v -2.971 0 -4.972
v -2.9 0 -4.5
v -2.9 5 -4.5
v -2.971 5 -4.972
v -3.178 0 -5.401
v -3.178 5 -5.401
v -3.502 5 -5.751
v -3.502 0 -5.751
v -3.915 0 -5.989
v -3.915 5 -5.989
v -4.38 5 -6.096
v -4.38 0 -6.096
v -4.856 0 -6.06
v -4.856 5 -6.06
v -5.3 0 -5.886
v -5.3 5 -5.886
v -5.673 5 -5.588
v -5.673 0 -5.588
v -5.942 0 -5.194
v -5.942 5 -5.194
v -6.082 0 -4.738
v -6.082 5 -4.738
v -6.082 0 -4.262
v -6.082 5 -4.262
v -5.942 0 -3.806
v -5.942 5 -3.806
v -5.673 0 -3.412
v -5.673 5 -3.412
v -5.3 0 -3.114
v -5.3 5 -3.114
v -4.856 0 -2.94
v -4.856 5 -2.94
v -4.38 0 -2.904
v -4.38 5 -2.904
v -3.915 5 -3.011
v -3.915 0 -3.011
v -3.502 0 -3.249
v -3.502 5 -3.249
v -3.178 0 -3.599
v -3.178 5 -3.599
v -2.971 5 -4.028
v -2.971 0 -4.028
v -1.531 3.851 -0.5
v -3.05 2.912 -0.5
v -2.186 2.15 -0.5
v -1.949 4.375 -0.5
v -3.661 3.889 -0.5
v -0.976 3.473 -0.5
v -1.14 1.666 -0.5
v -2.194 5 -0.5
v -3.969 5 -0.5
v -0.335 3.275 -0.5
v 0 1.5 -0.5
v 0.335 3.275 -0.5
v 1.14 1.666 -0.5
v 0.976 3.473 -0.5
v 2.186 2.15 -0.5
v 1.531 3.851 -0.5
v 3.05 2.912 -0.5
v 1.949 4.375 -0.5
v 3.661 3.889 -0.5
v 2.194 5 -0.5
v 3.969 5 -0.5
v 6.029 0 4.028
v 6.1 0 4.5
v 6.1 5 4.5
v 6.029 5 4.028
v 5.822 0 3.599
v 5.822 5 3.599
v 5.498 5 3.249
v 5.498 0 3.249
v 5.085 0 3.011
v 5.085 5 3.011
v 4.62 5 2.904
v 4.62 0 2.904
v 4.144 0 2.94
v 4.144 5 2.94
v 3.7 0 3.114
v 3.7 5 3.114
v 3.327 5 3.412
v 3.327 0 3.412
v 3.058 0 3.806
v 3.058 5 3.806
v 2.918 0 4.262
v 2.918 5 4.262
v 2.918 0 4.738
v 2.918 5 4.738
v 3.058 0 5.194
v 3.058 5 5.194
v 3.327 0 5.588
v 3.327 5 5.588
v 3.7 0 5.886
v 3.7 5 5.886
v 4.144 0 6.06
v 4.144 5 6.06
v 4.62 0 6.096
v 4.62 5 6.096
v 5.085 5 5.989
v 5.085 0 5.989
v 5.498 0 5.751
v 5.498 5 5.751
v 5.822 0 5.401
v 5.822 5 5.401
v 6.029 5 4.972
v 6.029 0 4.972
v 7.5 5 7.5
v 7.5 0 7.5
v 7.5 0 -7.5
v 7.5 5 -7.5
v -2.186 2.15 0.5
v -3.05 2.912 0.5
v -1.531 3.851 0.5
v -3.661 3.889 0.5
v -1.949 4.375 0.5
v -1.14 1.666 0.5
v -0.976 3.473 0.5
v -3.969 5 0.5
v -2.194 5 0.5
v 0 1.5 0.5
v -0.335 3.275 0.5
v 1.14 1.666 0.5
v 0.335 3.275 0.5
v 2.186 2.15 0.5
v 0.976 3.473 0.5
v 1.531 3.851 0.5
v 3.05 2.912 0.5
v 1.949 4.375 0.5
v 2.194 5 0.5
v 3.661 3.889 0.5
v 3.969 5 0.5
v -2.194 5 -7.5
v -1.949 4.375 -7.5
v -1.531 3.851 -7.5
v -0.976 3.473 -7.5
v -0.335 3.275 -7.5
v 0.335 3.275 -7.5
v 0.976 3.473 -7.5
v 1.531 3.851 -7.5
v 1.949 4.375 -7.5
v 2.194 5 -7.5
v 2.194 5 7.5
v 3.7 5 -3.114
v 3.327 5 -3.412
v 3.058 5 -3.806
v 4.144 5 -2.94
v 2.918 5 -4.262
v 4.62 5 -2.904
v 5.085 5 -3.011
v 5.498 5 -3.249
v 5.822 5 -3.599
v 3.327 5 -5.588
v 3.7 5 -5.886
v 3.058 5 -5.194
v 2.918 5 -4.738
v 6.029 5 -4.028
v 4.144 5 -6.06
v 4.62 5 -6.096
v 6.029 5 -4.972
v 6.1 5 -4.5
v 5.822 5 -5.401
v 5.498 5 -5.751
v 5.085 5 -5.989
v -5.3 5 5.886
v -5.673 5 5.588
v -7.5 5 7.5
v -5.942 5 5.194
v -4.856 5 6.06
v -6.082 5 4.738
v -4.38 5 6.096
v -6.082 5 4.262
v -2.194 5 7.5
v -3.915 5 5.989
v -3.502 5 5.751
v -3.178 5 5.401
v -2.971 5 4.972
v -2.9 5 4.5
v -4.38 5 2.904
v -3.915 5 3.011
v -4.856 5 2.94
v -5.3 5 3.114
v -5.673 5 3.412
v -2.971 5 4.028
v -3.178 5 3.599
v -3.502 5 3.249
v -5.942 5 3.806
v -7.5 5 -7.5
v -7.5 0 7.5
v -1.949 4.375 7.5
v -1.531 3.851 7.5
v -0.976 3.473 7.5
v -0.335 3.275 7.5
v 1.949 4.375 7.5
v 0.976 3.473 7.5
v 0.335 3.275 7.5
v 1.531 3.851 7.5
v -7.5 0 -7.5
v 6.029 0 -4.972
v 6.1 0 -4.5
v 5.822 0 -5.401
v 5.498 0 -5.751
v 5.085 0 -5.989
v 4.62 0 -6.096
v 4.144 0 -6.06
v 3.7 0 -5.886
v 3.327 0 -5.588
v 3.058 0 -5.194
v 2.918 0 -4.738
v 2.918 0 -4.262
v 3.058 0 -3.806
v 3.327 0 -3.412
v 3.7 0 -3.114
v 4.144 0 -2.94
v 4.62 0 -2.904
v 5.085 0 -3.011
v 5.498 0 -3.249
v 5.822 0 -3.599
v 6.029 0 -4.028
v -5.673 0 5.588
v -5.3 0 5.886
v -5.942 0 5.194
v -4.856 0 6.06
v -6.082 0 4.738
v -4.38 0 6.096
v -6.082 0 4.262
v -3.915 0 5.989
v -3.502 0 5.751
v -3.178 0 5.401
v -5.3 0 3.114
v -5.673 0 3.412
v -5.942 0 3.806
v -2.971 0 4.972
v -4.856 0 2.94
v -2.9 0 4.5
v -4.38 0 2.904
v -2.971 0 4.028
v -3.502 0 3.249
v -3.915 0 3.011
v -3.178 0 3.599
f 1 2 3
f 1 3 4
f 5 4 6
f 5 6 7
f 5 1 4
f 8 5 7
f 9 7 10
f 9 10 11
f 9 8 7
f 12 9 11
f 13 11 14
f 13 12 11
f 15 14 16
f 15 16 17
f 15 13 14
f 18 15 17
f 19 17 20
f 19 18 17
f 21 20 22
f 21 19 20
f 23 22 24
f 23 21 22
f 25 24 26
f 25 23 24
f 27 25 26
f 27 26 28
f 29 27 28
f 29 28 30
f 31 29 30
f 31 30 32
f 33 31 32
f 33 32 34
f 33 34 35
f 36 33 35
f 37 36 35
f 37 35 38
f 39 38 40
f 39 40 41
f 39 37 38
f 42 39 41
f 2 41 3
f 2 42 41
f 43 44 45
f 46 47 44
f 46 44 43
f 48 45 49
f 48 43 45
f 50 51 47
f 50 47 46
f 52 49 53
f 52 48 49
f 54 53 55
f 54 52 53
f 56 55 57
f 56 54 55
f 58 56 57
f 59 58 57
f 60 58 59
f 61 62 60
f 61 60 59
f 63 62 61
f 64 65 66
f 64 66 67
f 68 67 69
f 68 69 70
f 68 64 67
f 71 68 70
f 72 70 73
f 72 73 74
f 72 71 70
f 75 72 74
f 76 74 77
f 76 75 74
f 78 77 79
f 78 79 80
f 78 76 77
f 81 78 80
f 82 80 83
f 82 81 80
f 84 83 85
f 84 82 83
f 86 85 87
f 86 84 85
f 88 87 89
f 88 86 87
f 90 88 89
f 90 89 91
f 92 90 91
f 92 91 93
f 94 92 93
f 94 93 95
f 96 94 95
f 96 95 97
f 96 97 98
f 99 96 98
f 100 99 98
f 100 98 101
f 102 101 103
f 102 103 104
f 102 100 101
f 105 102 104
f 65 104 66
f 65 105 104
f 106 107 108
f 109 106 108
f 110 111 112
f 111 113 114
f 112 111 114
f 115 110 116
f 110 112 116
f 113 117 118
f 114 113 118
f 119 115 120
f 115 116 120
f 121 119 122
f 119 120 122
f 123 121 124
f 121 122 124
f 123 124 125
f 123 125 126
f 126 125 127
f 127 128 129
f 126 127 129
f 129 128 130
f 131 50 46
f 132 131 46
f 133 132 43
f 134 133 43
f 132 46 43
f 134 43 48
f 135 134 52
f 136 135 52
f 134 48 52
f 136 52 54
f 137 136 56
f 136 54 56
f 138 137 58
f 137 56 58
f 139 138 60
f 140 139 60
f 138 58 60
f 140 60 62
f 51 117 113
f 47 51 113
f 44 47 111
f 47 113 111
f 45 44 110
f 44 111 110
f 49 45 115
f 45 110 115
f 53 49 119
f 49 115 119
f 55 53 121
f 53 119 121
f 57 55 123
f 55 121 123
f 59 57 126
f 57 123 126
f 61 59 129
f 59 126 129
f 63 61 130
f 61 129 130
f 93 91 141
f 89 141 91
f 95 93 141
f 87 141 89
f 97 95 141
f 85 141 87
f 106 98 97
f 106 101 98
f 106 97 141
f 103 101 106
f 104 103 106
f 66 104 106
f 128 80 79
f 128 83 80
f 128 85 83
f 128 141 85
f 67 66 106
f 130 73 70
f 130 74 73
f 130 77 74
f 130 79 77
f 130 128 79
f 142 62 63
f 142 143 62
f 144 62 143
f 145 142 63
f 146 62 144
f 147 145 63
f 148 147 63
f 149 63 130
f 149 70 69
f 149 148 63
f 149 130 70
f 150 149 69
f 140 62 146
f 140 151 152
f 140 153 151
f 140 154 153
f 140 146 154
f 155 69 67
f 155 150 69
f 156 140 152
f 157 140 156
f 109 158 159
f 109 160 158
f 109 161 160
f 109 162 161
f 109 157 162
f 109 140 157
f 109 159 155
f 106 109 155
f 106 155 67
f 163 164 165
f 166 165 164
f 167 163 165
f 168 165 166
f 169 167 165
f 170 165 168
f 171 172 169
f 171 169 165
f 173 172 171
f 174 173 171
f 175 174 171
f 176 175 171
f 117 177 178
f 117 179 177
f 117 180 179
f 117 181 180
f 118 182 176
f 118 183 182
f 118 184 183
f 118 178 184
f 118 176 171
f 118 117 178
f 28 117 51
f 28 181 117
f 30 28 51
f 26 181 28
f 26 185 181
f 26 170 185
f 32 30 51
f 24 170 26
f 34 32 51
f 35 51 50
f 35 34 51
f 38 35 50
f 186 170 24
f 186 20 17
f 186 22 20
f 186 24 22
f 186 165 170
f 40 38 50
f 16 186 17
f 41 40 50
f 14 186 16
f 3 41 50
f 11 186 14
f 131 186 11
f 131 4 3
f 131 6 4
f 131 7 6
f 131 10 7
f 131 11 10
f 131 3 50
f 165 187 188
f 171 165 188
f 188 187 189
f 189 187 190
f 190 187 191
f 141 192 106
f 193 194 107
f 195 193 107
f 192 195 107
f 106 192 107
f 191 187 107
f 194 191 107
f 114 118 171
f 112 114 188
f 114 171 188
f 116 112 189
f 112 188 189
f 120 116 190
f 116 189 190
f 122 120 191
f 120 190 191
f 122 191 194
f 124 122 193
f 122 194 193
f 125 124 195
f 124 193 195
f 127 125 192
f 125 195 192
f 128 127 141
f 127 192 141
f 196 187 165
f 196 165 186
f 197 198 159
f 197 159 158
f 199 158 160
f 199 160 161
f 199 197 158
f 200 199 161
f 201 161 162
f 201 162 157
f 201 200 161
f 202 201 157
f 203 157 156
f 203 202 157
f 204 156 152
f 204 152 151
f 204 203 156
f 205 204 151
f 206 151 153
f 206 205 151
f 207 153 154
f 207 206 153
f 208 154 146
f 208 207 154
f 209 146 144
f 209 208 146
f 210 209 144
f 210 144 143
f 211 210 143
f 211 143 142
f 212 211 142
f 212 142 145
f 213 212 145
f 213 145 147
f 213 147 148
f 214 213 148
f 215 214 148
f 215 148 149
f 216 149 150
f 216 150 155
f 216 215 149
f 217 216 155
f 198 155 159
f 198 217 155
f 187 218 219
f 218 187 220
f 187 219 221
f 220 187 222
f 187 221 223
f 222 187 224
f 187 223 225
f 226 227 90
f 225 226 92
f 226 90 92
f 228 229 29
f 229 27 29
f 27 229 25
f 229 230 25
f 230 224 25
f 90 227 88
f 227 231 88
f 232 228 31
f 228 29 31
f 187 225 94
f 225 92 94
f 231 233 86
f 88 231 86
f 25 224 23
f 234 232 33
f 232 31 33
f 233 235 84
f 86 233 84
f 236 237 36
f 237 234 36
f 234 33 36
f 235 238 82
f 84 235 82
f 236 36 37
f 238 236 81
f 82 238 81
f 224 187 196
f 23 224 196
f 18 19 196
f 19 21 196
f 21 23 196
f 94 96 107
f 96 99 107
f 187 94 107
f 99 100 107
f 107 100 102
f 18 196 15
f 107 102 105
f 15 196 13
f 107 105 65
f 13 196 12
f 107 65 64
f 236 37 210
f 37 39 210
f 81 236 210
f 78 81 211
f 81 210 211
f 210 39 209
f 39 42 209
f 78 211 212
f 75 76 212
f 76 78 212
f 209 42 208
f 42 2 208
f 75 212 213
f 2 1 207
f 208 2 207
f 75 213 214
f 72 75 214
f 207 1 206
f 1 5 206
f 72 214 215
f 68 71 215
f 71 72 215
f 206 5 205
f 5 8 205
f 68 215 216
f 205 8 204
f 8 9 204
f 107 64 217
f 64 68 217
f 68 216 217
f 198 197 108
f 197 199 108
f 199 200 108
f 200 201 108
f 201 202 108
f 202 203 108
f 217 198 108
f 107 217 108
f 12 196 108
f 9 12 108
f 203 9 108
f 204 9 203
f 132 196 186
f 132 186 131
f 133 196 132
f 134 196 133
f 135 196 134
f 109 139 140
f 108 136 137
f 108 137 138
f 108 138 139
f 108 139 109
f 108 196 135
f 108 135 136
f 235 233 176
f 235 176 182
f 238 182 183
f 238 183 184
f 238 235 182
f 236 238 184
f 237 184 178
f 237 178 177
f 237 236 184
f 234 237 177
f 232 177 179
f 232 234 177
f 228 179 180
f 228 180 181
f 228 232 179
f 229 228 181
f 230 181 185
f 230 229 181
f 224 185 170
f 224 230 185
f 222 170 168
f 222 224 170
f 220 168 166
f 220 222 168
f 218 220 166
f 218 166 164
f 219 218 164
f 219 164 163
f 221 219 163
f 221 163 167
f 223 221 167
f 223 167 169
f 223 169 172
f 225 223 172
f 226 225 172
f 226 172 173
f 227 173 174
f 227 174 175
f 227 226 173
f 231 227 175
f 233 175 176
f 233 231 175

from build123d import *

# Parameters (mm, degrees)
SKIZZE1_W                       = 15
SKIZZE1_H                       = 15
SKIZZE1_R                       = 1.6
AUFSATZ_LINEAR_AUSTRAGEN1_DEPTH = 5
SKIZZE2_R                       = 2.25
SCHNITT_LINEAR_AUSTRAGEN1_DEPTH = 16
SKIZZE3_R                       = 4
SCHNITT_LINEAR_AUSTRAGEN2_DEPTH = 1


with BuildPart() as part:
    # Skizze1 → Aufsatz-Linear austragen1 (new body)
    with BuildSketch(Plane(origin=(0, 0, 0), x_dir=(1, 0, 0), z_dir=(0, 1, 0))):
        Rectangle(SKIZZE1_W, SKIZZE1_H)
        with Locations((-4.5, 4.5)):
            Circle(SKIZZE1_R, mode=Mode.SUBTRACT)
        with Locations((-4.5, -4.5)):
            Circle(SKIZZE1_R, mode=Mode.SUBTRACT)
        with Locations((4.5, -4.5)):
            Circle(SKIZZE1_R, mode=Mode.SUBTRACT)
        with Locations((4.5, 4.5)):
            Circle(SKIZZE1_R, mode=Mode.SUBTRACT)
    extrude(amount=AUFSATZ_LINEAR_AUSTRAGEN1_DEPTH)

    # Skizze2 → Schnitt-Linear austragen1 (cut, through all)
    with BuildSketch(Plane.XY.offset(7.5)):
        with Locations((0, 5.5)):
            Circle(SKIZZE2_R)
    extrude(amount=-SCHNITT_LINEAR_AUSTRAGEN1_DEPTH, mode=Mode.SUBTRACT)

    # Skizze3 → Schnitt-Linear austragen2 (cut)
    with BuildSketch(Plane.XY.offset(0.5)):
        with Locations((0, 5.5)):
            Circle(SKIZZE3_R)
    extrude(amount=-SCHNITT_LINEAR_AUSTRAGEN2_DEPTH, mode=Mode.SUBTRACT)


solid = part.part
